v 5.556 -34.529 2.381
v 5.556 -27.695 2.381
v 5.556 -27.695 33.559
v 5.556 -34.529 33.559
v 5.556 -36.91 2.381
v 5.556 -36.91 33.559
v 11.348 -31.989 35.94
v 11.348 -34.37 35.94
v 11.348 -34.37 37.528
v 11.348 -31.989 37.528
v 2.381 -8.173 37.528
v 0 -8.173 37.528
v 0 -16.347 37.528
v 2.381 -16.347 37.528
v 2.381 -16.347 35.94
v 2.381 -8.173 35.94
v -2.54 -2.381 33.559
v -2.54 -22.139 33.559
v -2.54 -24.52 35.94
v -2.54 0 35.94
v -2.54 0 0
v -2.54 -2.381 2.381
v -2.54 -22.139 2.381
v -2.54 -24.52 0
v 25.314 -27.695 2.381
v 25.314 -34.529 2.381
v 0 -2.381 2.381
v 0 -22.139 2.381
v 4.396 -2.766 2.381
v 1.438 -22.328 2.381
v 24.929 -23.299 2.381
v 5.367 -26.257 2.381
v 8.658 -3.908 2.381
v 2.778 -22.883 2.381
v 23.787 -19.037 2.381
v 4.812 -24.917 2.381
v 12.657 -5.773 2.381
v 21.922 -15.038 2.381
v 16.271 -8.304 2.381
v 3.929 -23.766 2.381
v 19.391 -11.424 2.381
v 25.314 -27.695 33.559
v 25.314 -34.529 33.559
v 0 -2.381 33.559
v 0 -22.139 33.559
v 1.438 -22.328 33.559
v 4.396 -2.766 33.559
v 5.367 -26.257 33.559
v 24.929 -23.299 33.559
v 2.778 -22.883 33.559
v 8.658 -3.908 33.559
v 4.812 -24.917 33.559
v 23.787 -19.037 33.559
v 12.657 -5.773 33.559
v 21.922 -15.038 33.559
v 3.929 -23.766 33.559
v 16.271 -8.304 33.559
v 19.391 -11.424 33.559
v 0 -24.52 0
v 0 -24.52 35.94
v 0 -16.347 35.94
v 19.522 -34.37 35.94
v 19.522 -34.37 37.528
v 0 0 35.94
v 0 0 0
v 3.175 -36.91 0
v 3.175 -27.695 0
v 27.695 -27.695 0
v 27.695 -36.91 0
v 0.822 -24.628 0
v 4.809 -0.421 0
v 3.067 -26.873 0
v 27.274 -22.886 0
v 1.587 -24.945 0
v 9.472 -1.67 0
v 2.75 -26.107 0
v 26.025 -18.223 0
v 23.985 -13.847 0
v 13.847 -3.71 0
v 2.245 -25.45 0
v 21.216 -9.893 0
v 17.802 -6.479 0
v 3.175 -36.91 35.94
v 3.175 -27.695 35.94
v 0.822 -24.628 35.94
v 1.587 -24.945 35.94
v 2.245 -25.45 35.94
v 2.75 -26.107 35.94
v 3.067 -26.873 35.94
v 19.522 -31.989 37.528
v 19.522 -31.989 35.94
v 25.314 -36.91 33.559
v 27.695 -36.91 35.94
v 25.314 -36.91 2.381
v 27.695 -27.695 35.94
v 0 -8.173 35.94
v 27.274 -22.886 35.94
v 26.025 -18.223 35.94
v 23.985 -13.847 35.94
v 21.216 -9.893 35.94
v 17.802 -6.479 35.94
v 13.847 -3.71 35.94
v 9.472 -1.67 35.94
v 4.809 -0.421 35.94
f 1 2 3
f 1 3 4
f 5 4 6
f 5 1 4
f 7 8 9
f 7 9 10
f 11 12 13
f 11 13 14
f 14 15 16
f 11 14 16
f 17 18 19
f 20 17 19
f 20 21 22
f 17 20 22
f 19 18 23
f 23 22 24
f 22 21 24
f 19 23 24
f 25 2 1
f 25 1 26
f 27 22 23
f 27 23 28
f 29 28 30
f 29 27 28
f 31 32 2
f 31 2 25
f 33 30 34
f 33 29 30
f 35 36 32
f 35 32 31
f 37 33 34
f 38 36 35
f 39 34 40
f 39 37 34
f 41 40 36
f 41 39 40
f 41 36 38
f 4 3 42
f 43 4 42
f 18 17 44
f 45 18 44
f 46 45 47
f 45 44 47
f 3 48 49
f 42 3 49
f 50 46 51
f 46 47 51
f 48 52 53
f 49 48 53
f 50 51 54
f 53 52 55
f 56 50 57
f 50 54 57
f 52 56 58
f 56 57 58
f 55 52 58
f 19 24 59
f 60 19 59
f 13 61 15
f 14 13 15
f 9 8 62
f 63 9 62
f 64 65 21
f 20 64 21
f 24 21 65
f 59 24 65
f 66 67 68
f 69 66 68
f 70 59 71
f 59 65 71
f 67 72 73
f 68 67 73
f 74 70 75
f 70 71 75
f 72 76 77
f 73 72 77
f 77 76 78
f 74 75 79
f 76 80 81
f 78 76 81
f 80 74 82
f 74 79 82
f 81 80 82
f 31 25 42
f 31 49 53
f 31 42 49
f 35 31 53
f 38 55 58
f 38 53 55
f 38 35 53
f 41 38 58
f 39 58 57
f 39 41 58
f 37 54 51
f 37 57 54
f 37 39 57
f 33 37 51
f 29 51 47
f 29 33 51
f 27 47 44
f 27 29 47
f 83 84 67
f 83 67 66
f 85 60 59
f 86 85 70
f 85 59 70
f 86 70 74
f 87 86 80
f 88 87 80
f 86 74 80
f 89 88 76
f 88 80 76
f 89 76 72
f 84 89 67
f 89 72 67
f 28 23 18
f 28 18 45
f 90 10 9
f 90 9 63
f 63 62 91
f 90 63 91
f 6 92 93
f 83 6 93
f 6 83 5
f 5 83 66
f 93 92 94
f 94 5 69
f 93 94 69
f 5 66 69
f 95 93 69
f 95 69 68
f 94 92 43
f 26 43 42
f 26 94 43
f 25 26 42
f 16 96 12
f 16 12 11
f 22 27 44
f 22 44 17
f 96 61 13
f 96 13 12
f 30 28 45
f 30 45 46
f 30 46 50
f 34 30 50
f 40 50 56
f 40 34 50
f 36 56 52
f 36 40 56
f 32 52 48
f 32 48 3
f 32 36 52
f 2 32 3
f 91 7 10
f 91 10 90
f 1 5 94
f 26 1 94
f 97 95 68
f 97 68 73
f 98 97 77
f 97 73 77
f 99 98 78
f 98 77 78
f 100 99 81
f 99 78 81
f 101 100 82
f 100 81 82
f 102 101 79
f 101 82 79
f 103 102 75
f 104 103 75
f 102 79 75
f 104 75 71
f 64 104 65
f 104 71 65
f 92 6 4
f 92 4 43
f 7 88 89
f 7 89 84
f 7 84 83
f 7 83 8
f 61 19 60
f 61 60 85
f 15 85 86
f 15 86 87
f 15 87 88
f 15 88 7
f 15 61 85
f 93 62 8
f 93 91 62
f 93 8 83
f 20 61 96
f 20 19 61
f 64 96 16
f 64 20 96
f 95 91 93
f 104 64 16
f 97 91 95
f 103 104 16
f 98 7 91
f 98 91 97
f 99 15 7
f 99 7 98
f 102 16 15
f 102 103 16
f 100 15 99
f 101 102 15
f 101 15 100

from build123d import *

# Parameters (mm, degrees)
F1_DEPTH = 35.940009
F2_T     = -2.38125
F3_W     = 19.757492
F3_H     = 31.177509
F4_DEPTH = 2.38125
F5_W     = 2.38125
F5_H     = 8.17333
F5_W_2   = 8.17333
F5_H_2   = 2.38125
F6_DEPTH = 1.5875


with BuildPart() as f1:
    # F0 (on Top) → F1 (new body)
    with BuildSketch(Plane.XY):
        with BuildLine():
            ThreePointArc((27.694992, -27.694992), (19.583316, -8.111675), (0, 0))
            Line((0, 0), (-2.54, 0))
            Line((-2.54, 0), (-2.54, -24.519992))
            Line((-2.54, -24.519992), (0, -24.519992))
            ThreePointArc((0, -24.519992), (2.245064, -25.449928), (3.175, -27.694992))
            Line((3.175, -27.694992), (3.175, -36.909985))
            Line((3.175, -36.909985), (27.694992, -36.909985))
            Line((27.694992, -36.909985), (27.694992, -27.694992))
        make_face()
    extrude(amount=F1_DEPTH)

    # F2
    f2_openings = [f1.faces().sort_by_distance(p)[0] for p in [
        (-2.54, -12.259996, 17.970005),
    ]]
    offset(amount=F2_T, openings=f2_openings)

    # F3 (on face) → F4 (cut)
    with BuildSketch(Plane.XZ.offset(36.909985)):
        with Locations((15.434996, 17.970005)):
            Rectangle(F3_W, F3_H)
    extrude(amount=-F4_DEPTH, mode=Mode.SUBTRACT)

    # F5 (on face) → F6 (join)
    with BuildSketch(Plane.XY.offset(35.940009)):
        with Locations((1.190625, -12.259996)):
            Rectangle(F5_W, F5_H)
        with Locations((15.434996, -33.17936)):
            Rectangle(F5_W_2, F5_H_2)
    extrude(amount=F6_DEPTH)


solid = f1.part
